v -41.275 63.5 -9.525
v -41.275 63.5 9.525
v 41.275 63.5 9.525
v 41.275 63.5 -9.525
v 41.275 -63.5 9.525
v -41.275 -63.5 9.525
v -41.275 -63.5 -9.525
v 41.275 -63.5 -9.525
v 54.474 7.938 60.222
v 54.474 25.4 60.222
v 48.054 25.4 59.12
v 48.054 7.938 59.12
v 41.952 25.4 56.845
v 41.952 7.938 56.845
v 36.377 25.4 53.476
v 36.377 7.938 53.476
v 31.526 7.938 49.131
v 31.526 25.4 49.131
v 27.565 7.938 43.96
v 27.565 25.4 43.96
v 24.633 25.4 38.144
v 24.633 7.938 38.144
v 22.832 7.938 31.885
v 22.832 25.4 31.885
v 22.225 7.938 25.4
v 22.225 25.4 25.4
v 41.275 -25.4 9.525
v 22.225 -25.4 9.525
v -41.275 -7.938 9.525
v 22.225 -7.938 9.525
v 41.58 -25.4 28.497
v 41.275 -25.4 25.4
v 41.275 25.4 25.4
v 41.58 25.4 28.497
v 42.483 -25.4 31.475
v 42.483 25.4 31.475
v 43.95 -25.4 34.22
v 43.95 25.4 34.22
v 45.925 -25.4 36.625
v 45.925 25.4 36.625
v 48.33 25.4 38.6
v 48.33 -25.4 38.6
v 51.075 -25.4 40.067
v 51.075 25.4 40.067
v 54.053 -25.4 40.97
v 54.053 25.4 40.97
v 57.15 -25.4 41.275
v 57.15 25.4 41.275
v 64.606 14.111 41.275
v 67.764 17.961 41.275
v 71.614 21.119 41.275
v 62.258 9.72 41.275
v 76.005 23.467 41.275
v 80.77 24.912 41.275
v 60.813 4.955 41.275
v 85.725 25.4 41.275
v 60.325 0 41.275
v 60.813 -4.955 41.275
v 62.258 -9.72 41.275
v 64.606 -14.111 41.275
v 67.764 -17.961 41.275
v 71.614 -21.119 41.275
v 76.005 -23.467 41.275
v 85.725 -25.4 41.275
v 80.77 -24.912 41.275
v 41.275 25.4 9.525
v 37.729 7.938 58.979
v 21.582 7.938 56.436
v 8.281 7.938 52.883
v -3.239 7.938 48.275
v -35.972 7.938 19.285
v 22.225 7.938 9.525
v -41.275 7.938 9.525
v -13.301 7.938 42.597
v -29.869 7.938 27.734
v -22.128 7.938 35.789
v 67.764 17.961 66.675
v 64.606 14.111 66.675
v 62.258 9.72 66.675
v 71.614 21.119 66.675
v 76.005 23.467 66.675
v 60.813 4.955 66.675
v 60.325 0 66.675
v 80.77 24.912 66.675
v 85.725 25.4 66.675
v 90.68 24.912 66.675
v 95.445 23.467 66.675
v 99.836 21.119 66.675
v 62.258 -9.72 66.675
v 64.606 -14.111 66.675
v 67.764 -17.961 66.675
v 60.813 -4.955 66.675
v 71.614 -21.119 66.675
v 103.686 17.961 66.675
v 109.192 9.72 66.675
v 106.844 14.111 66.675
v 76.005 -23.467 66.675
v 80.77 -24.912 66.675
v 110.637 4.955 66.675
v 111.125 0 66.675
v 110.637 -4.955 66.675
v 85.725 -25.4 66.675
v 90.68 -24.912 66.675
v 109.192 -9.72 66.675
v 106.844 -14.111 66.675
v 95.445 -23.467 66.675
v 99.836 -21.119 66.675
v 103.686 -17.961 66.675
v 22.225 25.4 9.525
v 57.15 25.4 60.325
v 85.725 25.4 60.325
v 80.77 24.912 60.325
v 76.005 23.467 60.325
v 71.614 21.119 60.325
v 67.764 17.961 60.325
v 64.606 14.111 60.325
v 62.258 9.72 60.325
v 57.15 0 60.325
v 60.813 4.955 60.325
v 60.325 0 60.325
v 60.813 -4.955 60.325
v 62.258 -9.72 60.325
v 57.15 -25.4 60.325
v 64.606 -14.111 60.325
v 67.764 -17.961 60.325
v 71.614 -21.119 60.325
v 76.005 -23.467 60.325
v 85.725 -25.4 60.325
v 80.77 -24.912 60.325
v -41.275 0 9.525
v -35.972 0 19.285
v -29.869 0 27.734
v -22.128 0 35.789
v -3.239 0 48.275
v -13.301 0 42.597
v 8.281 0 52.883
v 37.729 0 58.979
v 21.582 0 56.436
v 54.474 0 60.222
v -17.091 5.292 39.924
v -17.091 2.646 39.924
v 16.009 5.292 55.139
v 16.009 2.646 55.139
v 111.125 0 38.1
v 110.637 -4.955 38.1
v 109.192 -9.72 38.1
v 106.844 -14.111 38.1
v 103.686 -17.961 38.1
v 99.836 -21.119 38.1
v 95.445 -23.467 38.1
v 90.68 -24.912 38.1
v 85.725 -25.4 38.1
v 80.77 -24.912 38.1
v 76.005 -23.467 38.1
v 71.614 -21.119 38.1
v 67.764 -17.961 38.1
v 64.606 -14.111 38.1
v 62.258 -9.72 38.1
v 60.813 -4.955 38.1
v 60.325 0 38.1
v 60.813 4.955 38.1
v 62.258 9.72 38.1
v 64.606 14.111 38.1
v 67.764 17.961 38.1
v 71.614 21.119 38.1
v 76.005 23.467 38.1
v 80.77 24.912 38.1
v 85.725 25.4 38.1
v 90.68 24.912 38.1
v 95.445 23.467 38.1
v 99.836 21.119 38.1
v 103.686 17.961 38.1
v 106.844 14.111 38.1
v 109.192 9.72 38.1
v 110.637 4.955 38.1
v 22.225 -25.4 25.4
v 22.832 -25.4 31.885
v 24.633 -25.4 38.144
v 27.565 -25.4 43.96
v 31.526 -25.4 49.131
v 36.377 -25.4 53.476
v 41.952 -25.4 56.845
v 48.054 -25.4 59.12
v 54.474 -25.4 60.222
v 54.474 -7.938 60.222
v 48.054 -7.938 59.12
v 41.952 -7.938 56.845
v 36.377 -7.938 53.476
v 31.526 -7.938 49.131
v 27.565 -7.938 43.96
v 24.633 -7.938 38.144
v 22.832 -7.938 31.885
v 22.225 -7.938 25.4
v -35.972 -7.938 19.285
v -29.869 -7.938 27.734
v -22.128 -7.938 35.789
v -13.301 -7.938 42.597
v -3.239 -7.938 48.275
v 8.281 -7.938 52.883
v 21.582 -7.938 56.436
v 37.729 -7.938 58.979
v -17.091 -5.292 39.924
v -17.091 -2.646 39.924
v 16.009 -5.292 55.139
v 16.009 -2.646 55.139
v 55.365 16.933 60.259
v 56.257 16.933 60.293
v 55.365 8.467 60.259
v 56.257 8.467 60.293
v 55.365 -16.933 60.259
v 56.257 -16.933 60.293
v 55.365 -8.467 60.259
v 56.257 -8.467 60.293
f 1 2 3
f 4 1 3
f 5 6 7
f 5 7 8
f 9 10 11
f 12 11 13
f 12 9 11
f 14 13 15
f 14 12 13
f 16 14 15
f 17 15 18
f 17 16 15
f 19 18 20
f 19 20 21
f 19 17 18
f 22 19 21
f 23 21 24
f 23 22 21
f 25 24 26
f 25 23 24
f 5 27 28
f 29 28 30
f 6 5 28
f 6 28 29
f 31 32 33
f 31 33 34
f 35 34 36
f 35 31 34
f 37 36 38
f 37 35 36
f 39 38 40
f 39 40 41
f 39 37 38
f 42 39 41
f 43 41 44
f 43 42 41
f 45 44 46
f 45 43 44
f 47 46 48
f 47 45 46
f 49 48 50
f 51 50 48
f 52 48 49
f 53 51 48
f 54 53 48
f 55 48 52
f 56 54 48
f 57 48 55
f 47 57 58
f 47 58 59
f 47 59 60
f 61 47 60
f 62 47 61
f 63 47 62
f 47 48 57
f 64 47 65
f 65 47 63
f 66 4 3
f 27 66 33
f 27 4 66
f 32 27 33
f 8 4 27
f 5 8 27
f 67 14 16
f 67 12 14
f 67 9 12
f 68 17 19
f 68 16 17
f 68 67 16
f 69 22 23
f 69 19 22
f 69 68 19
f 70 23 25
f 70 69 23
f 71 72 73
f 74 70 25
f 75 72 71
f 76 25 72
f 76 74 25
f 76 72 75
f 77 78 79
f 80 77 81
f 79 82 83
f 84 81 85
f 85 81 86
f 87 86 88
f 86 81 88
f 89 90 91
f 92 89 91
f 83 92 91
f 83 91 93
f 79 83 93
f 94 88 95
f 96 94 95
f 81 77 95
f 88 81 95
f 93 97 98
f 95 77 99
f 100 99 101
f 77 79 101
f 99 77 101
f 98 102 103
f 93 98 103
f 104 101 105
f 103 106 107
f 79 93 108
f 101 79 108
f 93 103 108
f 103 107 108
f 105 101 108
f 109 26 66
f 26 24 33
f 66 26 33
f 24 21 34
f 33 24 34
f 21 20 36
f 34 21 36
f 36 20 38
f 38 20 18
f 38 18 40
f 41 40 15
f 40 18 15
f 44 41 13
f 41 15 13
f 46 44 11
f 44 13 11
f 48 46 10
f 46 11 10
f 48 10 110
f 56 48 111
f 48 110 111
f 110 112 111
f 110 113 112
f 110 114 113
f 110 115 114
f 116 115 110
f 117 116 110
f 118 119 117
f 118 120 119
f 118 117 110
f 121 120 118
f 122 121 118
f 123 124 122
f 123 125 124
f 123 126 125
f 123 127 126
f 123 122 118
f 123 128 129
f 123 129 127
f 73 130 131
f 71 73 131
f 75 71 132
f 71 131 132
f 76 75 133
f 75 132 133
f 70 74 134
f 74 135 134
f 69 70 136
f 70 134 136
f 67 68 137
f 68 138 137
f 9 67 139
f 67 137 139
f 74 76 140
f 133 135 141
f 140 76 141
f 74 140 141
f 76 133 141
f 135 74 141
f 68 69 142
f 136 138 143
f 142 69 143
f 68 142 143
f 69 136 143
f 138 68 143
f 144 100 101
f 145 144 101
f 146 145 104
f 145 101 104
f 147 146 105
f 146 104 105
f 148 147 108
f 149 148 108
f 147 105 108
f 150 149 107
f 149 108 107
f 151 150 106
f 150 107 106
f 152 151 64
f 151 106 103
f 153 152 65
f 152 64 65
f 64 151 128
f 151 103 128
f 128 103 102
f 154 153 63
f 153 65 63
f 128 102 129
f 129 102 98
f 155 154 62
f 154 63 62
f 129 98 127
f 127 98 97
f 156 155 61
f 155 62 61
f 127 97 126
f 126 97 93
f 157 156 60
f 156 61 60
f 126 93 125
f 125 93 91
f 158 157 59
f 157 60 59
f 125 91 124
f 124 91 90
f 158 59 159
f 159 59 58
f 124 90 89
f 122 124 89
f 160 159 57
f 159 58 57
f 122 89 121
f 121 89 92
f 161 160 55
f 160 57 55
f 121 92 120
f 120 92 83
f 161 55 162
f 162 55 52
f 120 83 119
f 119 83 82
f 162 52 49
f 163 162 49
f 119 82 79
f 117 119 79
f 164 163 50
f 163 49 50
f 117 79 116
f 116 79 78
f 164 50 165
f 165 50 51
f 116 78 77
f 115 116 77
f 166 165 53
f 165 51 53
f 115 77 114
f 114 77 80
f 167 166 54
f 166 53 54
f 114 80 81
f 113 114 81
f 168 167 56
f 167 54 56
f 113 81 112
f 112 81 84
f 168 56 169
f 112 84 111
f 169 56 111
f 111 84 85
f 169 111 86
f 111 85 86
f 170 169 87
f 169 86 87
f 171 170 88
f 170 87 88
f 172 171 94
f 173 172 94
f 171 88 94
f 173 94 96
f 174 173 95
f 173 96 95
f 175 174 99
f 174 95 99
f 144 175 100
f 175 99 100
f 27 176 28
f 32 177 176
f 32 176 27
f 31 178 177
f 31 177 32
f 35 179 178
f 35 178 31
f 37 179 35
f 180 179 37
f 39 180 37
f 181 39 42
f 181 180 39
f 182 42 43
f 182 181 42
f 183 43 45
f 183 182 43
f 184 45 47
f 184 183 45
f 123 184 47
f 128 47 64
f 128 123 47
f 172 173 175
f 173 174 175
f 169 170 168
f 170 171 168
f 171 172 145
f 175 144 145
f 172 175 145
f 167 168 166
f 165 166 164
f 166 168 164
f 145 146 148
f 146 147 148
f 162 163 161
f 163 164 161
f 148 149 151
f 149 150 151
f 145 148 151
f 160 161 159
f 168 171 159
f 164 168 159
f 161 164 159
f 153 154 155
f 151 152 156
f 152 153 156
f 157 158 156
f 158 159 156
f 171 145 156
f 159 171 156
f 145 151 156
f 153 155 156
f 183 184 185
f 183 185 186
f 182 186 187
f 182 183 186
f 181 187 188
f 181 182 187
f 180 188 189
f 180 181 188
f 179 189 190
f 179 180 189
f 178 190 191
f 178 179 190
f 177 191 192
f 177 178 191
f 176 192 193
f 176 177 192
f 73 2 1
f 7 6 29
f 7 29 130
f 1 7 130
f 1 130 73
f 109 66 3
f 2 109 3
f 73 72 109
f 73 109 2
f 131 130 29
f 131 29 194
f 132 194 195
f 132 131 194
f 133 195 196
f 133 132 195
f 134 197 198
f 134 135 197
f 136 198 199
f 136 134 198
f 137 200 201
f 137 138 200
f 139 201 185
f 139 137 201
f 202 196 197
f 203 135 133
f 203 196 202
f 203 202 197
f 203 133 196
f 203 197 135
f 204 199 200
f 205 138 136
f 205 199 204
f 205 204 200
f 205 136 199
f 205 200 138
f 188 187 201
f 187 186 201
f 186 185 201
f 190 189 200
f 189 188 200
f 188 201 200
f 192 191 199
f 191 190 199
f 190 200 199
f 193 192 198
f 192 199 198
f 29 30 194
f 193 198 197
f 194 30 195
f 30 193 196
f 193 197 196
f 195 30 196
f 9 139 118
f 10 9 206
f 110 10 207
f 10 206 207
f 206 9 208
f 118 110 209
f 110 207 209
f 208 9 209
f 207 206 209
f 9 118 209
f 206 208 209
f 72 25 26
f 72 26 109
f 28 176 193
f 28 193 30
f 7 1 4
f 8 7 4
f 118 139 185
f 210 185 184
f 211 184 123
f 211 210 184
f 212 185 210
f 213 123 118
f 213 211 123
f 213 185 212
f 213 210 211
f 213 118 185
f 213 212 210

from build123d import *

# Parameters (mm, degrees)
F1_DEPTH = 63.5
F0_W     = 25.4
F0_H     = 19.05
F2_DEPTH = 25.4
F3_DEPTH = 7.9375


with BuildPart() as f1:
    # F0 (on Front) → F1 (new body, symmetric)
    with BuildSketch(Plane.XZ):
        Polygon((22.225, 9.525), (-41.275, 9.525), (-41.275, -9.525), (41.275, -9.525), (41.275, 9.525), align=None)
    extrude(amount=F1_DEPTH, both=True)

    # F0 (on Front) → F2 (join, symmetric)
    with BuildSketch(Plane.XZ):
        with BuildLine():
            Line((22.225, 25.4), (22.225, 9.525))
            Line((22.225, 9.525), (41.275, 9.525))
            Line((41.275, 9.525), (41.275, 25.4))
            ThreePointArc((41.275, 25.4), (45.9246798487, 36.6253201513), (57.15, 41.275))
            Line((57.15, 41.275), (60.325, 41.275))
            Line((60.325, 41.275), (60.325, 60.325))
            Line((60.325, 60.325), (57.15, 60.325))
            add(Edge.make_bspline(
                [(54.4736162544, 60.222300255), (55.3644540215, 60.2602361648), (56.2566409869, 60.2943854647), (57.15, 60.325)],
                knots=[108.3462442053, 108.3462442053, 108.3462442053, 108.3462442053, 110.761548495, 110.761548495, 110.761548495, 110.761548495], degree=3))
            ThreePointArc((54.4736162544, 60.222300255), (31.5255163241, 49.1306017906), (22.225, 25.4))
        make_face()
        with Locations((73.025, 50.8)):
            Rectangle(F0_W, F0_H)
    extrude(amount=F2_DEPTH, both=True)

    # F0 (on Front) → F3 (join, symmetric)
    with BuildSketch(Plane.XZ):
        with BuildLine():
            add(Edge.make_bspline(
                [(-41.275, 9.525), (-22.7342342872, 49.1991834723), (14.5122222919, 58.5205629773), (54.4736162544, 60.222300255)],
                knots=[0, 0, 0, 0, 108.3462442053, 108.3462442053, 108.3462442053, 108.3462442053], degree=3))
            Line((-41.275, 9.525), (22.225, 9.525))
            Line((22.225, 9.525), (22.225, 25.4))
            ThreePointArc((22.225, 25.4), (31.5255163241, 49.1306017906), (54.4736162544, 60.222300255))
        make_face()
    extrude(amount=F3_DEPTH, both=True)

    # F0 (on Front) → F4 (revolve)
    with BuildSketch(Plane.XZ):
        Polygon((85.725, 66.675), (85.725, 60.325), (85.725, 41.275), (85.725, 38.1), (111.125, 38.1), (111.125, 66.675), align=None)
    revolve(axis=Axis((85.725, 0, 53.975), (0, 0, -1)))


solid = f1.part
